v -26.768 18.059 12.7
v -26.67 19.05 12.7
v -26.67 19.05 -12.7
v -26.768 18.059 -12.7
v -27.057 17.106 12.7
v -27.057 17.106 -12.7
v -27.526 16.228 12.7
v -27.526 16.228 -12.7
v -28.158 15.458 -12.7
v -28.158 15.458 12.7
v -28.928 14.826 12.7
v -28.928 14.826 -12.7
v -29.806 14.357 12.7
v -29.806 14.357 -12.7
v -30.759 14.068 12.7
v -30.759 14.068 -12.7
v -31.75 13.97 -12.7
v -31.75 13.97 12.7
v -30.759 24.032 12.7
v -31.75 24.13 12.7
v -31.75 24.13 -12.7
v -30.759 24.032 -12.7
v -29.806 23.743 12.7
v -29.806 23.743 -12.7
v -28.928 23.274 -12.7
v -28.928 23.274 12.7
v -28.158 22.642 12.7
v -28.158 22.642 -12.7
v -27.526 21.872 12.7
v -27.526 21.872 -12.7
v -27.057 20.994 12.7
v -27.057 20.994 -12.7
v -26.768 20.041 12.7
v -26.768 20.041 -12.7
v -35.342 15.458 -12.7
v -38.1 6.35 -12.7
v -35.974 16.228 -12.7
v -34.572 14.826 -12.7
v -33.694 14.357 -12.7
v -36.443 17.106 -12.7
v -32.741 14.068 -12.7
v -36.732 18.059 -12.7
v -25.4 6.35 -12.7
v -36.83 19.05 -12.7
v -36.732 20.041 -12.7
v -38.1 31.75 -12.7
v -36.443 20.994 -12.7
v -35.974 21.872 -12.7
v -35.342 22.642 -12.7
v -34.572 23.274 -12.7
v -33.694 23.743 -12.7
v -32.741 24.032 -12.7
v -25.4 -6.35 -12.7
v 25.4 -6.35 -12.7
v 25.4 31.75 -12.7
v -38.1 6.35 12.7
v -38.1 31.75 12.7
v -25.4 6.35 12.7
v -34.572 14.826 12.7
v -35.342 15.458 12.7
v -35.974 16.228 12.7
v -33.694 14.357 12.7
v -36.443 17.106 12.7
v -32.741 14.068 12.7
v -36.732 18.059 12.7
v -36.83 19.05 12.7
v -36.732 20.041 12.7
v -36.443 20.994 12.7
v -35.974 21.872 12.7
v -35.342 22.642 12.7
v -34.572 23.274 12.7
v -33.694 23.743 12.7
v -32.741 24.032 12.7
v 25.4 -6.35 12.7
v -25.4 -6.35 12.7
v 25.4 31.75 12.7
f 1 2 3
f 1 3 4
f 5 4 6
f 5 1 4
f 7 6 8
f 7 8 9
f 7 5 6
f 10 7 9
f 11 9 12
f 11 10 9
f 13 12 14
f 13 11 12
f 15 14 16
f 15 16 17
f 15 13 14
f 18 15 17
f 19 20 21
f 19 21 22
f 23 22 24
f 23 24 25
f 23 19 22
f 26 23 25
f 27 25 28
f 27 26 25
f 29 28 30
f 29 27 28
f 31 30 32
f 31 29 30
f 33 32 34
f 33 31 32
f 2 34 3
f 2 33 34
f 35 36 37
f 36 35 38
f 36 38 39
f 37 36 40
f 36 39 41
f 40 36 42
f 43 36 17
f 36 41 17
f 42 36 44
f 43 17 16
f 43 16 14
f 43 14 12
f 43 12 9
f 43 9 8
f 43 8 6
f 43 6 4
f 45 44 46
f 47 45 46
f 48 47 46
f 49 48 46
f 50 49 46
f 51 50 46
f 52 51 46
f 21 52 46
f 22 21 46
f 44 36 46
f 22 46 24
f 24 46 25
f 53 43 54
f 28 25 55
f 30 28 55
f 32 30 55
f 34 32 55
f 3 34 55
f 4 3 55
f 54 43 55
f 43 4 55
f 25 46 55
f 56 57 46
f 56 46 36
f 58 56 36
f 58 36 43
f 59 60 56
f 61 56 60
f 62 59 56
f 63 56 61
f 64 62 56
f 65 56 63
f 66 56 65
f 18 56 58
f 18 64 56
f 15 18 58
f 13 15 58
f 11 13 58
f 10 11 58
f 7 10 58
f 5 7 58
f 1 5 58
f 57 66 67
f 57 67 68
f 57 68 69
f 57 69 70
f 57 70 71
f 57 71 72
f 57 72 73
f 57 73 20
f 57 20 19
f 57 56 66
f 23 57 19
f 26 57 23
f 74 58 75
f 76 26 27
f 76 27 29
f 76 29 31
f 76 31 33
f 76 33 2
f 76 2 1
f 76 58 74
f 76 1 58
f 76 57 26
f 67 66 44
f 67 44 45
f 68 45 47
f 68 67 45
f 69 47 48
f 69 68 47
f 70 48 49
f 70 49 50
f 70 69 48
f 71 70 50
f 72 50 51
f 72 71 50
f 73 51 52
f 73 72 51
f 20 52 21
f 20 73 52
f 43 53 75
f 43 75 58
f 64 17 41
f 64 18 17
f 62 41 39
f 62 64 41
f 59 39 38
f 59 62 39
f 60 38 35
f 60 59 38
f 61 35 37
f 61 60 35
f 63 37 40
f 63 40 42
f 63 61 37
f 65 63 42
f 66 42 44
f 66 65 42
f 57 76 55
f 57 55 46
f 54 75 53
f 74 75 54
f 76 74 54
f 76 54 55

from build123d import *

# Parameters (mm, degrees)
F0_W     = 50.8
F0_H     = 12.7
F1_DEPTH = 12.7
F2_DEPTH = 12.7


with BuildPart() as f1:
    # F0 (on Top) → F1 (new body, symmetric)
    with BuildSketch(Plane.XY):
        Rectangle(F0_W, F0_H)
    extrude(amount=F1_DEPTH, both=True)

    # F0 (on Top) → F2 (join, symmetric)
    with BuildSketch(Plane.XY):
        Polygon((-25.4, 6.35), (25.4, 6.35), (25.4, 31.75), (-25.4, 31.75), (-25.4, 19.05), align=None)
        with BuildLine():
            Line((-26.67, 19.05), (-25.4, 19.05))
            Line((-25.4, 19.05), (-25.4, 31.75))
            Line((-25.4, 31.75), (-31.75, 31.75))
            Line((-31.75, 31.75), (-31.75, 24.13))
            ThreePointArc((-31.75, 24.13), (-28.157898, 22.642102), (-26.67, 19.05))
        make_face()
        with BuildLine():
            Line((-31.75, 24.13), (-31.75, 31.75))
            Line((-31.75, 31.75), (-38.1, 31.75))
            Line((-38.1, 31.75), (-38.1, 19.05))
            Line((-38.1, 19.05), (-36.83, 19.05))
            ThreePointArc((-36.83, 19.05), (-35.342102, 22.642102), (-31.75, 24.13))
        make_face()
        with BuildLine():
            Line((-38.1, 6.35), (-31.75, 6.35))
            Line((-31.75, 6.35), (-31.75, 13.97))
            ThreePointArc((-31.75, 13.97), (-35.342102, 15.457898), (-36.83, 19.05))
            Line((-36.83, 19.05), (-38.1, 19.05))
            Line((-38.1, 19.05), (-38.1, 6.35))
        make_face()
        with BuildLine():
            Line((-31.75, 6.35), (-25.4, 6.35))
            Line((-25.4, 6.35), (-25.4, 19.05))
            Line((-25.4, 19.05), (-26.67, 19.05))
            ThreePointArc((-26.67, 19.05), (-28.157898, 15.457898), (-31.75, 13.97))
            Line((-31.75, 13.97), (-31.75, 6.35))
        make_face()
    extrude(amount=F2_DEPTH, both=True)


solid = f1.part
